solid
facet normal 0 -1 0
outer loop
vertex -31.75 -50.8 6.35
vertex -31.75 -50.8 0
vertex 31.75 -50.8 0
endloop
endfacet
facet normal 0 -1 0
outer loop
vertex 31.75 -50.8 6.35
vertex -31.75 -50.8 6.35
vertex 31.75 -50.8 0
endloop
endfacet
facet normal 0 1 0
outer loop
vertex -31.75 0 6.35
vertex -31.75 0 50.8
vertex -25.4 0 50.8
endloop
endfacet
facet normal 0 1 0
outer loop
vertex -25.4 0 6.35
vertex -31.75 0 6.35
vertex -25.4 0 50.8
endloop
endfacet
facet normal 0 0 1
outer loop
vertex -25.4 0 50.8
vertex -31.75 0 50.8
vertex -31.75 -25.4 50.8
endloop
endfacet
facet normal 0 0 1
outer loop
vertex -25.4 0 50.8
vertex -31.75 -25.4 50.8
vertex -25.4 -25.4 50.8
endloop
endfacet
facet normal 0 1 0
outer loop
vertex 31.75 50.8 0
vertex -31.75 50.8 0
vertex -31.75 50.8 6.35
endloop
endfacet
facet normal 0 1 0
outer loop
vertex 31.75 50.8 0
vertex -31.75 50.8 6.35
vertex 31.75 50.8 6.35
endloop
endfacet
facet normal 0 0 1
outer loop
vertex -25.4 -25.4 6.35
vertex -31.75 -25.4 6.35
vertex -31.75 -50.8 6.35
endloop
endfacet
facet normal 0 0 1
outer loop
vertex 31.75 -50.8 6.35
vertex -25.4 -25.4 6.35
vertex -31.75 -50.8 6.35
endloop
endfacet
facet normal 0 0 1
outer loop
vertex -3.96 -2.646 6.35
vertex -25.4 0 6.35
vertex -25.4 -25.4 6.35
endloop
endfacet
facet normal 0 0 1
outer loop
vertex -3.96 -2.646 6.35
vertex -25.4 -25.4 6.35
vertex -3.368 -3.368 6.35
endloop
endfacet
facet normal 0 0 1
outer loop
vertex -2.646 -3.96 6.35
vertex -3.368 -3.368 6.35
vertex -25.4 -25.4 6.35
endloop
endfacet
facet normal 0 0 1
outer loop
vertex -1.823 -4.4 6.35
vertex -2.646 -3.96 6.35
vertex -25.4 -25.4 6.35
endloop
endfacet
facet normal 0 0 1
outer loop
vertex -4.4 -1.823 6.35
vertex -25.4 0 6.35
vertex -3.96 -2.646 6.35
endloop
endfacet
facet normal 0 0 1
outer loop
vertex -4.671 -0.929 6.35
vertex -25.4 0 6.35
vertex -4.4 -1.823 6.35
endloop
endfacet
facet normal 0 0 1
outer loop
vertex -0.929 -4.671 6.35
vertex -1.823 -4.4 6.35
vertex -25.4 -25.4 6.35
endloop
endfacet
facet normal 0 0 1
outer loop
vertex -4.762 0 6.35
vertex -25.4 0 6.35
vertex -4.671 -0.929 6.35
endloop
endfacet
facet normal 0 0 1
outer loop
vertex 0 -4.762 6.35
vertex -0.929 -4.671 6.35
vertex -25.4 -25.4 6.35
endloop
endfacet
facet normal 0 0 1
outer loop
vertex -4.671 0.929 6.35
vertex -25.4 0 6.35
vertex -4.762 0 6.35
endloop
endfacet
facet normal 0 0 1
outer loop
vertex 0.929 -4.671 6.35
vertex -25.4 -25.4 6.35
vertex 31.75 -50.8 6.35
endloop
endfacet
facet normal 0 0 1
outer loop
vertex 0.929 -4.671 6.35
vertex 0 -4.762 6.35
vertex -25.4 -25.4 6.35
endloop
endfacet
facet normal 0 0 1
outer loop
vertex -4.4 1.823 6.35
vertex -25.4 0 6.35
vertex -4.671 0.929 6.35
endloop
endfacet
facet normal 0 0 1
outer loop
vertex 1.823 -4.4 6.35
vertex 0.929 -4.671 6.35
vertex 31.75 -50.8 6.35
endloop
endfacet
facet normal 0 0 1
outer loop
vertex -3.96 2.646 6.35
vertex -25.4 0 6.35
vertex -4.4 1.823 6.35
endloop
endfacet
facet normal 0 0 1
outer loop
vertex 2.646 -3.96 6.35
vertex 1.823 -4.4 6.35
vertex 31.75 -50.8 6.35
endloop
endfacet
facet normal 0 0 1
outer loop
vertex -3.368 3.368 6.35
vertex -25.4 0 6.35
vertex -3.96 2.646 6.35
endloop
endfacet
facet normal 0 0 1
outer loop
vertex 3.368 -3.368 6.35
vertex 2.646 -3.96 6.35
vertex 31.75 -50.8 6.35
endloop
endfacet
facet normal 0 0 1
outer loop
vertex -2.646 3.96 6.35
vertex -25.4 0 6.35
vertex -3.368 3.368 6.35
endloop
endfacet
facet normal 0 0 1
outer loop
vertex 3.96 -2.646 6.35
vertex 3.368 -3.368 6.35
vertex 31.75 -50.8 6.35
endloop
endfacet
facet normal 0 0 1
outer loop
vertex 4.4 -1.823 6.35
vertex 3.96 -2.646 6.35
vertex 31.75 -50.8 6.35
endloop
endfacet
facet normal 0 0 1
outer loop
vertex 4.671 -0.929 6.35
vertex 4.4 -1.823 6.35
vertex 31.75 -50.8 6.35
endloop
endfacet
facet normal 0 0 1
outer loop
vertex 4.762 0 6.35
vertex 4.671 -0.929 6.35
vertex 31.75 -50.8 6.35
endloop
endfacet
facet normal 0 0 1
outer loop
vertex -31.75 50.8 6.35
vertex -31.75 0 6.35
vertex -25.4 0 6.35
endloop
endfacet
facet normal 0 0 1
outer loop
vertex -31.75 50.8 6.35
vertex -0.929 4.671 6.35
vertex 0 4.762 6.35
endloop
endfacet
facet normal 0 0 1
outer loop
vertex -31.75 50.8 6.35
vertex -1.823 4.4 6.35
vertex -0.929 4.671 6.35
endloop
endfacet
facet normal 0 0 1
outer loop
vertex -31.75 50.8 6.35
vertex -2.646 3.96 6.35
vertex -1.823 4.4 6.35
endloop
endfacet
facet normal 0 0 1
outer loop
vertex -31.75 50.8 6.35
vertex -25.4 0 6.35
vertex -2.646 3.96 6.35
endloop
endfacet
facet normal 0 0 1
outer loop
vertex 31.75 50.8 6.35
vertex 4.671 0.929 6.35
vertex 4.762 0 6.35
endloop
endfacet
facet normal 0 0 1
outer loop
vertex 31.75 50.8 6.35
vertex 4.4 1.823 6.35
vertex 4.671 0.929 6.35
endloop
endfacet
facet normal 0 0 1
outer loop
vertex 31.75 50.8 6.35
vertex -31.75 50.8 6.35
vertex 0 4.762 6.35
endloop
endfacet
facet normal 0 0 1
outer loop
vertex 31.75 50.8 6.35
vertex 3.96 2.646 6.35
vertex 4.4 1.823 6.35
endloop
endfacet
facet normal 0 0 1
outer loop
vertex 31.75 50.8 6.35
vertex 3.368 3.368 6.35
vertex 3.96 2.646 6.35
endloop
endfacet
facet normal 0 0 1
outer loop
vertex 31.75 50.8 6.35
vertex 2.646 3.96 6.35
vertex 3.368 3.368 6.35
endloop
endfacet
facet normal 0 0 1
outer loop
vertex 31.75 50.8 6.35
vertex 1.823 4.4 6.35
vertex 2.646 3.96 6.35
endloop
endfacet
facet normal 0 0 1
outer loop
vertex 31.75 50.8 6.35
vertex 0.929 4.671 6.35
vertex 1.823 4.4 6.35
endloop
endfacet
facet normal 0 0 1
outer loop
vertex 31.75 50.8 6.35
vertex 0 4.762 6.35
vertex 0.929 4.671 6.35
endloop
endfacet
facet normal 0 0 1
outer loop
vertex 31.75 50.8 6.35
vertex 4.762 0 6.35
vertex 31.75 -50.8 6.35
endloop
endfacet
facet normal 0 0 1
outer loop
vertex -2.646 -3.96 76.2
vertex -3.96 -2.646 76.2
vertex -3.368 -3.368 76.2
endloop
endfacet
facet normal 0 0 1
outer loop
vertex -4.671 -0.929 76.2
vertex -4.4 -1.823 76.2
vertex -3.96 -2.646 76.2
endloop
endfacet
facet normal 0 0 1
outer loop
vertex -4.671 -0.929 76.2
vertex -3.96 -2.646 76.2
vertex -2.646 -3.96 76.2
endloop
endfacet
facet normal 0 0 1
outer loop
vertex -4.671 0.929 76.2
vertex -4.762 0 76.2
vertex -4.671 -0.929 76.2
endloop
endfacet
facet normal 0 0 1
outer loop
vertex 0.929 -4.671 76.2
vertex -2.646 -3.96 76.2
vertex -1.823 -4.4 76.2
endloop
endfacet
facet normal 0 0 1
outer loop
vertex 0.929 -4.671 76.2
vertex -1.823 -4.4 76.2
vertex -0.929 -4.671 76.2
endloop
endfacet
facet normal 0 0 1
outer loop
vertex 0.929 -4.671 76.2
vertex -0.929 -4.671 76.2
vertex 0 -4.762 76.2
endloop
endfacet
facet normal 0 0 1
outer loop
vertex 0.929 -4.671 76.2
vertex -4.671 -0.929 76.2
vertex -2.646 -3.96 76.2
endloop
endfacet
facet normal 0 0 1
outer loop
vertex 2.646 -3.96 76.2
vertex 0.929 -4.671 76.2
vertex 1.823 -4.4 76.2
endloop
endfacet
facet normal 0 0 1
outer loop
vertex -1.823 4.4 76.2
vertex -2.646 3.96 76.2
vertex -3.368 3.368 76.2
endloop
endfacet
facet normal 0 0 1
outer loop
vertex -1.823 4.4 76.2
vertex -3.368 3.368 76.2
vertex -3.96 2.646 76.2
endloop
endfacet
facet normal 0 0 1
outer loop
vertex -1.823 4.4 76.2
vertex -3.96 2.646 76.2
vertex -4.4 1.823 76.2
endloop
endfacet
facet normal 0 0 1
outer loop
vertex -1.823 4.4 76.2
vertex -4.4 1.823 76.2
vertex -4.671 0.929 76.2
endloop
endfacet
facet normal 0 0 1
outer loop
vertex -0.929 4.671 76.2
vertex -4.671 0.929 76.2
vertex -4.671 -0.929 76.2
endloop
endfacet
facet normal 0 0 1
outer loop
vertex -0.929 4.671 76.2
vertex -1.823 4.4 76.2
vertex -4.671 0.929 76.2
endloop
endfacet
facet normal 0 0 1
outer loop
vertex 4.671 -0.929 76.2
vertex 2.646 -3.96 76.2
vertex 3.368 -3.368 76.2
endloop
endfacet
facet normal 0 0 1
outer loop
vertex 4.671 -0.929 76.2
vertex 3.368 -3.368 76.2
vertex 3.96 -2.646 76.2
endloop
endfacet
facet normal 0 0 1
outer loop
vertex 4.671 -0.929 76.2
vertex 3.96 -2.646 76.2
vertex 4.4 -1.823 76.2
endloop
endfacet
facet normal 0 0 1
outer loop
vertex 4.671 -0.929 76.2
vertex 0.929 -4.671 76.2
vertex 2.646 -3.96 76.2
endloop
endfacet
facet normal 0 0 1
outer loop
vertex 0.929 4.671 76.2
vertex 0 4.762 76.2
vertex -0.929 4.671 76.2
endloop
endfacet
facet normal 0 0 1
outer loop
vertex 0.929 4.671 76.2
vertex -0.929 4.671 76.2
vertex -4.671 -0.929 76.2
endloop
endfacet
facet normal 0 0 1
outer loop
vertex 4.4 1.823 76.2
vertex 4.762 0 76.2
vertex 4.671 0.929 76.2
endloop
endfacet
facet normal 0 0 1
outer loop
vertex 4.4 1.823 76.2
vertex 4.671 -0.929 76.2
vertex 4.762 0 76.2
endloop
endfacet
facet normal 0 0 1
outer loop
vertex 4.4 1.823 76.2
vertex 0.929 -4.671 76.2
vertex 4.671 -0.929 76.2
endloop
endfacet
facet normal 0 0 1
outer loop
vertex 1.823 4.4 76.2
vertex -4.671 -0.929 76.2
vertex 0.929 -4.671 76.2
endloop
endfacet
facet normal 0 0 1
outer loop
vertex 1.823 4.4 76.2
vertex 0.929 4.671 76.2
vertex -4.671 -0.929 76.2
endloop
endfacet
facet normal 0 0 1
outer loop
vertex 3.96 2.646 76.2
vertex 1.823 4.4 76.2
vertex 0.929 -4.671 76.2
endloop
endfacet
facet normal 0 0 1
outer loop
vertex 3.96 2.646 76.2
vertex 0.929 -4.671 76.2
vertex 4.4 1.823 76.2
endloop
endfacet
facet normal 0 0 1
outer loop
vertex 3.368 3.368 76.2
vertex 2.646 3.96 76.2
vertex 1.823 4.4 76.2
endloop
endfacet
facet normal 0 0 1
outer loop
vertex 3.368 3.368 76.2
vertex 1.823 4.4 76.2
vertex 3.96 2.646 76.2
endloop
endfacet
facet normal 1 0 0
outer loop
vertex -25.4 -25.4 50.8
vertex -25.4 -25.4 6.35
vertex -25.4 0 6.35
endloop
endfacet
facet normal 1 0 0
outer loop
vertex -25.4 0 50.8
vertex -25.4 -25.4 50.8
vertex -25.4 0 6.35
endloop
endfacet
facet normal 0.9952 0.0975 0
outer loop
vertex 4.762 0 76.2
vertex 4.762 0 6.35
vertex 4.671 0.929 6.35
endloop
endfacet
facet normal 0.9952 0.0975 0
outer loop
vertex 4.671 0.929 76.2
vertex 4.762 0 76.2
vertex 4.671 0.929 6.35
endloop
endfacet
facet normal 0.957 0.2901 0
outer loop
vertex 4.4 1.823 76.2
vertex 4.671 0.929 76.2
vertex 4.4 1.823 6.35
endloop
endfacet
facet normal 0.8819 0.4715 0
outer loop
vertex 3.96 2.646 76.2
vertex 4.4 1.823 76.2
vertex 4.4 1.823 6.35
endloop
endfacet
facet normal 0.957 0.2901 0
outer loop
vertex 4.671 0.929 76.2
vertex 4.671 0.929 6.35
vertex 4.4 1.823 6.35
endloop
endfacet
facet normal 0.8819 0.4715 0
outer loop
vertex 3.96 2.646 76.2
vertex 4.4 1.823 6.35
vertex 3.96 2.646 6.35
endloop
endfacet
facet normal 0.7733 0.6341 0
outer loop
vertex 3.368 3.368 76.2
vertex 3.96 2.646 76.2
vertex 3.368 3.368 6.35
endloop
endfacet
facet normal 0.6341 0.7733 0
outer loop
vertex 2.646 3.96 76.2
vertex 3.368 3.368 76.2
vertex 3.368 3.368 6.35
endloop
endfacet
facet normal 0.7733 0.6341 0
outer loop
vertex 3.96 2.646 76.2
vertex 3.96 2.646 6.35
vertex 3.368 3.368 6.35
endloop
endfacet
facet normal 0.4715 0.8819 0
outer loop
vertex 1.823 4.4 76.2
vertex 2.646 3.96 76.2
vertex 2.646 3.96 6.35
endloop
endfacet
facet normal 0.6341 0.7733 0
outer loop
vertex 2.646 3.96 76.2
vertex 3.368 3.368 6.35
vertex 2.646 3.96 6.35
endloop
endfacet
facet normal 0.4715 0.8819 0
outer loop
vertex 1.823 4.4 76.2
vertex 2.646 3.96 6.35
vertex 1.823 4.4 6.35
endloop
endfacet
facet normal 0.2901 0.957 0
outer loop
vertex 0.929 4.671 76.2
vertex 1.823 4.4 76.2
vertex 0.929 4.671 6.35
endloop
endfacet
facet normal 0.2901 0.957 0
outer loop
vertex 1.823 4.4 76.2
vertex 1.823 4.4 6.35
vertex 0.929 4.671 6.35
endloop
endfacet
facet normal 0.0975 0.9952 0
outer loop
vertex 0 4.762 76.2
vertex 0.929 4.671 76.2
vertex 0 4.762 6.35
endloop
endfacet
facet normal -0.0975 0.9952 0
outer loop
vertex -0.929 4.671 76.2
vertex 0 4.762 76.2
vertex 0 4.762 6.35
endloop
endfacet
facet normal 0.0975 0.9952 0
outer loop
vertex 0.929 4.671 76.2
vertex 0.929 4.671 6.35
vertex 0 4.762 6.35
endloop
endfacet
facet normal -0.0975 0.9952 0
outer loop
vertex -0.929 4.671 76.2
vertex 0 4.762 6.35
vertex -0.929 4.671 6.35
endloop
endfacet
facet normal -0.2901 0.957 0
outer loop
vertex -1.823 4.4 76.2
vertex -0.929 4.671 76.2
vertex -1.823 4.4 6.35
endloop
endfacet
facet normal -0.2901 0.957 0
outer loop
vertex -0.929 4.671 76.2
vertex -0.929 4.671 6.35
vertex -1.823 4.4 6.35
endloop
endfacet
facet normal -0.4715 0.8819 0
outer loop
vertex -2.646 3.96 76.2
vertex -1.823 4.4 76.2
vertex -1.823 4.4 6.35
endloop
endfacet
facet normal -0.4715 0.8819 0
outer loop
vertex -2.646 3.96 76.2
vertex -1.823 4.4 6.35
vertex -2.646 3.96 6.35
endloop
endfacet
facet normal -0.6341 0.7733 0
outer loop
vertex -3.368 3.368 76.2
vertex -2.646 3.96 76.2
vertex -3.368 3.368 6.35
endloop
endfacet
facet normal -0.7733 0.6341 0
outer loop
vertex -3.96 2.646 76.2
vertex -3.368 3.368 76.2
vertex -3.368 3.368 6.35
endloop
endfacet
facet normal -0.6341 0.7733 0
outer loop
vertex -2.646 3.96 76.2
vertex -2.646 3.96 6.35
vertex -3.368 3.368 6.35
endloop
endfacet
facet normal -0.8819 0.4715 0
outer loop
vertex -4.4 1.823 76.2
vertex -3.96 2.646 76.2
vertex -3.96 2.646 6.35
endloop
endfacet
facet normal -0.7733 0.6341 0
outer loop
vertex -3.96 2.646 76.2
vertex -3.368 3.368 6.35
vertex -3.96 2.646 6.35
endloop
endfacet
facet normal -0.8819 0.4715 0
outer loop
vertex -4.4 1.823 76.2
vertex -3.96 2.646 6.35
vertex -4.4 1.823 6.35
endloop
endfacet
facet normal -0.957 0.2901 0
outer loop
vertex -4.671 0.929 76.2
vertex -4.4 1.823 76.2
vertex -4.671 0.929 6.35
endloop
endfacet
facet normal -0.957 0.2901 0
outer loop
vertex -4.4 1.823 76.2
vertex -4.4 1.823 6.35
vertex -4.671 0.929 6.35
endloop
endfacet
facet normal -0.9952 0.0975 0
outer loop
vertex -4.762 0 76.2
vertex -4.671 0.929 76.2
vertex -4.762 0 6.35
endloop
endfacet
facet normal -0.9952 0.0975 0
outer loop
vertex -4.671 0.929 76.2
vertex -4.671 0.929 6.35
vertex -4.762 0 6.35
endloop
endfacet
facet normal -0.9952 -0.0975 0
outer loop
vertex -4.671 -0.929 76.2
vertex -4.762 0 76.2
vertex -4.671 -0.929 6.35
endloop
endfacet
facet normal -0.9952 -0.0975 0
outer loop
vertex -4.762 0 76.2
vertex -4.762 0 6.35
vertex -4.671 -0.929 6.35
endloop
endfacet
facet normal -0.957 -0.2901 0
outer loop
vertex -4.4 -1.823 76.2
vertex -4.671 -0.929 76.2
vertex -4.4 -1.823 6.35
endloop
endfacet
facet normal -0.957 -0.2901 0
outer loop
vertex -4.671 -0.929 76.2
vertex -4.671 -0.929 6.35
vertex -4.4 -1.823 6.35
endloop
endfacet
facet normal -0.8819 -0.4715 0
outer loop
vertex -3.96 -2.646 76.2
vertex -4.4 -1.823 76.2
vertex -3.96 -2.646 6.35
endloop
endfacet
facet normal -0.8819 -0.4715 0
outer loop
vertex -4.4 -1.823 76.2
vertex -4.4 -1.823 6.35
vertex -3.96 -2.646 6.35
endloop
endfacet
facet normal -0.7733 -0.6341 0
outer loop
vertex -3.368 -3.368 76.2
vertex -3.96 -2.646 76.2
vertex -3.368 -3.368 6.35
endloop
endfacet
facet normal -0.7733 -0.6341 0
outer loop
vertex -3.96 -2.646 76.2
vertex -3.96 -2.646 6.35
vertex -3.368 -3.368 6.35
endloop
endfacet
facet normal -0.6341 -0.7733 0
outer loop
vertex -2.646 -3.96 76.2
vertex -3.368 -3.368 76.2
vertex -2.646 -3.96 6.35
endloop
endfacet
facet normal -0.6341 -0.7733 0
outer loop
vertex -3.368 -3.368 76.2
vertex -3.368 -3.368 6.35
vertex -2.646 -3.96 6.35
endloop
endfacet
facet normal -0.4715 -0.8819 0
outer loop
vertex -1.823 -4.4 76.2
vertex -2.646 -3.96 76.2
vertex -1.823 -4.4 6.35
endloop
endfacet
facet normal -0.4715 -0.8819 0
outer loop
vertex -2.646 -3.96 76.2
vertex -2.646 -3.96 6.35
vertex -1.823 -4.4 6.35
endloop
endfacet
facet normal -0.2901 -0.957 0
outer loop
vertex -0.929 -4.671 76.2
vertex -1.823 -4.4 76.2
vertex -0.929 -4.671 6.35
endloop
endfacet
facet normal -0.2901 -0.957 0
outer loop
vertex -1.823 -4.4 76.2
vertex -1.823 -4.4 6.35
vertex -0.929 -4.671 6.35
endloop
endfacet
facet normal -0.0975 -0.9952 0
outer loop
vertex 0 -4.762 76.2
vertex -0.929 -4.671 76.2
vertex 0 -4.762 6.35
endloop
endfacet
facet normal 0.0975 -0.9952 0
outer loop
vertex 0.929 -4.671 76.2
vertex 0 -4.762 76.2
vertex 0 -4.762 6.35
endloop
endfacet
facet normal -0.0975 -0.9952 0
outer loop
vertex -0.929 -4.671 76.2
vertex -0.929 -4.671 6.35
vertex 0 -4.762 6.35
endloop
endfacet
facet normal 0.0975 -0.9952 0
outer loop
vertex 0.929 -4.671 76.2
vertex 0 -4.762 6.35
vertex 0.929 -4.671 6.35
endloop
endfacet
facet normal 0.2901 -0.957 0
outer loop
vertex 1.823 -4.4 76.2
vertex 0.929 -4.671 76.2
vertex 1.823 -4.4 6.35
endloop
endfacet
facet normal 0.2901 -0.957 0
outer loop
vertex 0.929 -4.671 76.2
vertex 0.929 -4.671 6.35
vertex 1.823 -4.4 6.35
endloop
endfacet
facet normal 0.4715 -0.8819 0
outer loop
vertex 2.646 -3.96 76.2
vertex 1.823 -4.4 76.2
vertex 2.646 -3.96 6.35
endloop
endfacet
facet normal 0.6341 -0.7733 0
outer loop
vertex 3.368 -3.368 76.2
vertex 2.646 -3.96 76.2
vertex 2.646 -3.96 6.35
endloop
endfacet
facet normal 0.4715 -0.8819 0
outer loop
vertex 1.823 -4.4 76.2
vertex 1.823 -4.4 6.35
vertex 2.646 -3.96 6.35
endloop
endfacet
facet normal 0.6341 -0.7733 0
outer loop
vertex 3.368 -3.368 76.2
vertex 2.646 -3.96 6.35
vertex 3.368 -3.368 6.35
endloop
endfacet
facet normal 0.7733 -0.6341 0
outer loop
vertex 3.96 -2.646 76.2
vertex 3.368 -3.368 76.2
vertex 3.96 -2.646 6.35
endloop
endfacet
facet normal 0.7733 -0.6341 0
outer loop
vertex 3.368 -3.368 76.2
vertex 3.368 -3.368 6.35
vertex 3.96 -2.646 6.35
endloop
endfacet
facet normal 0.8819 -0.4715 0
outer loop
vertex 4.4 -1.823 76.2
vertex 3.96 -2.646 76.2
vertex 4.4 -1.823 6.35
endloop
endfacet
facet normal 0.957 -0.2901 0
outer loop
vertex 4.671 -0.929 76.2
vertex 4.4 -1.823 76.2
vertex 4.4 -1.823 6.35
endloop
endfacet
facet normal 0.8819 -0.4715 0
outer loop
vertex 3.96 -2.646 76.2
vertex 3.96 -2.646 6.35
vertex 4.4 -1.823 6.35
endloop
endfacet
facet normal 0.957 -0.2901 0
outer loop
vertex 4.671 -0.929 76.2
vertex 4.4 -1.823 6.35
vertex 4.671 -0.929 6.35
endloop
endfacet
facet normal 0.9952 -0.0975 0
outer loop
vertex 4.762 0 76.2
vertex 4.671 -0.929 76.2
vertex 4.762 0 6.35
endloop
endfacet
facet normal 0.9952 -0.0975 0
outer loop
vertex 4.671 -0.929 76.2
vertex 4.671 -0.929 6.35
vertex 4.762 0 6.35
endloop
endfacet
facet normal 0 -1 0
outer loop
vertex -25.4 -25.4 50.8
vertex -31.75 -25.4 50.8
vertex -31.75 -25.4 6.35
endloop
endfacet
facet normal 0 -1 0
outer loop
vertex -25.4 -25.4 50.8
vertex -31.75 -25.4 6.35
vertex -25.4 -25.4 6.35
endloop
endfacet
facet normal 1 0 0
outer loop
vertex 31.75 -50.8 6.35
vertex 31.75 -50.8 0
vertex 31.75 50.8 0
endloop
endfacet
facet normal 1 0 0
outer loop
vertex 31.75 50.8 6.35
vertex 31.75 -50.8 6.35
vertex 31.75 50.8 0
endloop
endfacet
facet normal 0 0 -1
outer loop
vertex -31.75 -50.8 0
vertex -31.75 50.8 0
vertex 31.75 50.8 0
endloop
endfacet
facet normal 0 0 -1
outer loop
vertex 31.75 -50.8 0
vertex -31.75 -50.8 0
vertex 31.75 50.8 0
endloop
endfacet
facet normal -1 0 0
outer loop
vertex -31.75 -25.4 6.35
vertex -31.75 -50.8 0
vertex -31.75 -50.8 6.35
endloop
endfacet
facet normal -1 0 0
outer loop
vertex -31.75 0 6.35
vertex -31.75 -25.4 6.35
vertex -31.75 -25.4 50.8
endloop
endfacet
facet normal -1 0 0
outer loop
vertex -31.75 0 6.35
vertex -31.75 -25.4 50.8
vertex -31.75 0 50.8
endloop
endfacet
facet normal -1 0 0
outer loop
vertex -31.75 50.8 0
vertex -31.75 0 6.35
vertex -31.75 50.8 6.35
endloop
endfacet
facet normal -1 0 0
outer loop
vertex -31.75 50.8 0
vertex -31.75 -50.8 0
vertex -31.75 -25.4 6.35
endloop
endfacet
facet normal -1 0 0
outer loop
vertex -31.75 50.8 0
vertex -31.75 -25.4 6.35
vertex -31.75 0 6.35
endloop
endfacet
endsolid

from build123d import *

# Parameters (mm, degrees)
F0_W     = 63.5
F0_H     = 101.6
F1_DEPTH = 6.35
F2_R     = 4.7625
F3_DEPTH = 69.85
F4_W     = 6.35
F4_H     = 25.4
F5_DEPTH = 44.45


with BuildPart() as f1:
    # F0 (on Top) → F1 (new body)
    with BuildSketch(Plane.XY):
        Rectangle(F0_W, F0_H)
    extrude(amount=F1_DEPTH)

    # F2 (on face) → F3 (join)
    with BuildSketch(Plane.XY.offset(6.35)):
        Circle(F2_R)
    extrude(amount=F3_DEPTH)

    # F4 (on face) → F5 (join)
    with BuildSketch(Plane.XY.offset(6.35)):
        with Locations((-28.575, -12.7)):
            Rectangle(F4_W, F4_H)
    extrude(amount=F5_DEPTH)


solid = f1.part
